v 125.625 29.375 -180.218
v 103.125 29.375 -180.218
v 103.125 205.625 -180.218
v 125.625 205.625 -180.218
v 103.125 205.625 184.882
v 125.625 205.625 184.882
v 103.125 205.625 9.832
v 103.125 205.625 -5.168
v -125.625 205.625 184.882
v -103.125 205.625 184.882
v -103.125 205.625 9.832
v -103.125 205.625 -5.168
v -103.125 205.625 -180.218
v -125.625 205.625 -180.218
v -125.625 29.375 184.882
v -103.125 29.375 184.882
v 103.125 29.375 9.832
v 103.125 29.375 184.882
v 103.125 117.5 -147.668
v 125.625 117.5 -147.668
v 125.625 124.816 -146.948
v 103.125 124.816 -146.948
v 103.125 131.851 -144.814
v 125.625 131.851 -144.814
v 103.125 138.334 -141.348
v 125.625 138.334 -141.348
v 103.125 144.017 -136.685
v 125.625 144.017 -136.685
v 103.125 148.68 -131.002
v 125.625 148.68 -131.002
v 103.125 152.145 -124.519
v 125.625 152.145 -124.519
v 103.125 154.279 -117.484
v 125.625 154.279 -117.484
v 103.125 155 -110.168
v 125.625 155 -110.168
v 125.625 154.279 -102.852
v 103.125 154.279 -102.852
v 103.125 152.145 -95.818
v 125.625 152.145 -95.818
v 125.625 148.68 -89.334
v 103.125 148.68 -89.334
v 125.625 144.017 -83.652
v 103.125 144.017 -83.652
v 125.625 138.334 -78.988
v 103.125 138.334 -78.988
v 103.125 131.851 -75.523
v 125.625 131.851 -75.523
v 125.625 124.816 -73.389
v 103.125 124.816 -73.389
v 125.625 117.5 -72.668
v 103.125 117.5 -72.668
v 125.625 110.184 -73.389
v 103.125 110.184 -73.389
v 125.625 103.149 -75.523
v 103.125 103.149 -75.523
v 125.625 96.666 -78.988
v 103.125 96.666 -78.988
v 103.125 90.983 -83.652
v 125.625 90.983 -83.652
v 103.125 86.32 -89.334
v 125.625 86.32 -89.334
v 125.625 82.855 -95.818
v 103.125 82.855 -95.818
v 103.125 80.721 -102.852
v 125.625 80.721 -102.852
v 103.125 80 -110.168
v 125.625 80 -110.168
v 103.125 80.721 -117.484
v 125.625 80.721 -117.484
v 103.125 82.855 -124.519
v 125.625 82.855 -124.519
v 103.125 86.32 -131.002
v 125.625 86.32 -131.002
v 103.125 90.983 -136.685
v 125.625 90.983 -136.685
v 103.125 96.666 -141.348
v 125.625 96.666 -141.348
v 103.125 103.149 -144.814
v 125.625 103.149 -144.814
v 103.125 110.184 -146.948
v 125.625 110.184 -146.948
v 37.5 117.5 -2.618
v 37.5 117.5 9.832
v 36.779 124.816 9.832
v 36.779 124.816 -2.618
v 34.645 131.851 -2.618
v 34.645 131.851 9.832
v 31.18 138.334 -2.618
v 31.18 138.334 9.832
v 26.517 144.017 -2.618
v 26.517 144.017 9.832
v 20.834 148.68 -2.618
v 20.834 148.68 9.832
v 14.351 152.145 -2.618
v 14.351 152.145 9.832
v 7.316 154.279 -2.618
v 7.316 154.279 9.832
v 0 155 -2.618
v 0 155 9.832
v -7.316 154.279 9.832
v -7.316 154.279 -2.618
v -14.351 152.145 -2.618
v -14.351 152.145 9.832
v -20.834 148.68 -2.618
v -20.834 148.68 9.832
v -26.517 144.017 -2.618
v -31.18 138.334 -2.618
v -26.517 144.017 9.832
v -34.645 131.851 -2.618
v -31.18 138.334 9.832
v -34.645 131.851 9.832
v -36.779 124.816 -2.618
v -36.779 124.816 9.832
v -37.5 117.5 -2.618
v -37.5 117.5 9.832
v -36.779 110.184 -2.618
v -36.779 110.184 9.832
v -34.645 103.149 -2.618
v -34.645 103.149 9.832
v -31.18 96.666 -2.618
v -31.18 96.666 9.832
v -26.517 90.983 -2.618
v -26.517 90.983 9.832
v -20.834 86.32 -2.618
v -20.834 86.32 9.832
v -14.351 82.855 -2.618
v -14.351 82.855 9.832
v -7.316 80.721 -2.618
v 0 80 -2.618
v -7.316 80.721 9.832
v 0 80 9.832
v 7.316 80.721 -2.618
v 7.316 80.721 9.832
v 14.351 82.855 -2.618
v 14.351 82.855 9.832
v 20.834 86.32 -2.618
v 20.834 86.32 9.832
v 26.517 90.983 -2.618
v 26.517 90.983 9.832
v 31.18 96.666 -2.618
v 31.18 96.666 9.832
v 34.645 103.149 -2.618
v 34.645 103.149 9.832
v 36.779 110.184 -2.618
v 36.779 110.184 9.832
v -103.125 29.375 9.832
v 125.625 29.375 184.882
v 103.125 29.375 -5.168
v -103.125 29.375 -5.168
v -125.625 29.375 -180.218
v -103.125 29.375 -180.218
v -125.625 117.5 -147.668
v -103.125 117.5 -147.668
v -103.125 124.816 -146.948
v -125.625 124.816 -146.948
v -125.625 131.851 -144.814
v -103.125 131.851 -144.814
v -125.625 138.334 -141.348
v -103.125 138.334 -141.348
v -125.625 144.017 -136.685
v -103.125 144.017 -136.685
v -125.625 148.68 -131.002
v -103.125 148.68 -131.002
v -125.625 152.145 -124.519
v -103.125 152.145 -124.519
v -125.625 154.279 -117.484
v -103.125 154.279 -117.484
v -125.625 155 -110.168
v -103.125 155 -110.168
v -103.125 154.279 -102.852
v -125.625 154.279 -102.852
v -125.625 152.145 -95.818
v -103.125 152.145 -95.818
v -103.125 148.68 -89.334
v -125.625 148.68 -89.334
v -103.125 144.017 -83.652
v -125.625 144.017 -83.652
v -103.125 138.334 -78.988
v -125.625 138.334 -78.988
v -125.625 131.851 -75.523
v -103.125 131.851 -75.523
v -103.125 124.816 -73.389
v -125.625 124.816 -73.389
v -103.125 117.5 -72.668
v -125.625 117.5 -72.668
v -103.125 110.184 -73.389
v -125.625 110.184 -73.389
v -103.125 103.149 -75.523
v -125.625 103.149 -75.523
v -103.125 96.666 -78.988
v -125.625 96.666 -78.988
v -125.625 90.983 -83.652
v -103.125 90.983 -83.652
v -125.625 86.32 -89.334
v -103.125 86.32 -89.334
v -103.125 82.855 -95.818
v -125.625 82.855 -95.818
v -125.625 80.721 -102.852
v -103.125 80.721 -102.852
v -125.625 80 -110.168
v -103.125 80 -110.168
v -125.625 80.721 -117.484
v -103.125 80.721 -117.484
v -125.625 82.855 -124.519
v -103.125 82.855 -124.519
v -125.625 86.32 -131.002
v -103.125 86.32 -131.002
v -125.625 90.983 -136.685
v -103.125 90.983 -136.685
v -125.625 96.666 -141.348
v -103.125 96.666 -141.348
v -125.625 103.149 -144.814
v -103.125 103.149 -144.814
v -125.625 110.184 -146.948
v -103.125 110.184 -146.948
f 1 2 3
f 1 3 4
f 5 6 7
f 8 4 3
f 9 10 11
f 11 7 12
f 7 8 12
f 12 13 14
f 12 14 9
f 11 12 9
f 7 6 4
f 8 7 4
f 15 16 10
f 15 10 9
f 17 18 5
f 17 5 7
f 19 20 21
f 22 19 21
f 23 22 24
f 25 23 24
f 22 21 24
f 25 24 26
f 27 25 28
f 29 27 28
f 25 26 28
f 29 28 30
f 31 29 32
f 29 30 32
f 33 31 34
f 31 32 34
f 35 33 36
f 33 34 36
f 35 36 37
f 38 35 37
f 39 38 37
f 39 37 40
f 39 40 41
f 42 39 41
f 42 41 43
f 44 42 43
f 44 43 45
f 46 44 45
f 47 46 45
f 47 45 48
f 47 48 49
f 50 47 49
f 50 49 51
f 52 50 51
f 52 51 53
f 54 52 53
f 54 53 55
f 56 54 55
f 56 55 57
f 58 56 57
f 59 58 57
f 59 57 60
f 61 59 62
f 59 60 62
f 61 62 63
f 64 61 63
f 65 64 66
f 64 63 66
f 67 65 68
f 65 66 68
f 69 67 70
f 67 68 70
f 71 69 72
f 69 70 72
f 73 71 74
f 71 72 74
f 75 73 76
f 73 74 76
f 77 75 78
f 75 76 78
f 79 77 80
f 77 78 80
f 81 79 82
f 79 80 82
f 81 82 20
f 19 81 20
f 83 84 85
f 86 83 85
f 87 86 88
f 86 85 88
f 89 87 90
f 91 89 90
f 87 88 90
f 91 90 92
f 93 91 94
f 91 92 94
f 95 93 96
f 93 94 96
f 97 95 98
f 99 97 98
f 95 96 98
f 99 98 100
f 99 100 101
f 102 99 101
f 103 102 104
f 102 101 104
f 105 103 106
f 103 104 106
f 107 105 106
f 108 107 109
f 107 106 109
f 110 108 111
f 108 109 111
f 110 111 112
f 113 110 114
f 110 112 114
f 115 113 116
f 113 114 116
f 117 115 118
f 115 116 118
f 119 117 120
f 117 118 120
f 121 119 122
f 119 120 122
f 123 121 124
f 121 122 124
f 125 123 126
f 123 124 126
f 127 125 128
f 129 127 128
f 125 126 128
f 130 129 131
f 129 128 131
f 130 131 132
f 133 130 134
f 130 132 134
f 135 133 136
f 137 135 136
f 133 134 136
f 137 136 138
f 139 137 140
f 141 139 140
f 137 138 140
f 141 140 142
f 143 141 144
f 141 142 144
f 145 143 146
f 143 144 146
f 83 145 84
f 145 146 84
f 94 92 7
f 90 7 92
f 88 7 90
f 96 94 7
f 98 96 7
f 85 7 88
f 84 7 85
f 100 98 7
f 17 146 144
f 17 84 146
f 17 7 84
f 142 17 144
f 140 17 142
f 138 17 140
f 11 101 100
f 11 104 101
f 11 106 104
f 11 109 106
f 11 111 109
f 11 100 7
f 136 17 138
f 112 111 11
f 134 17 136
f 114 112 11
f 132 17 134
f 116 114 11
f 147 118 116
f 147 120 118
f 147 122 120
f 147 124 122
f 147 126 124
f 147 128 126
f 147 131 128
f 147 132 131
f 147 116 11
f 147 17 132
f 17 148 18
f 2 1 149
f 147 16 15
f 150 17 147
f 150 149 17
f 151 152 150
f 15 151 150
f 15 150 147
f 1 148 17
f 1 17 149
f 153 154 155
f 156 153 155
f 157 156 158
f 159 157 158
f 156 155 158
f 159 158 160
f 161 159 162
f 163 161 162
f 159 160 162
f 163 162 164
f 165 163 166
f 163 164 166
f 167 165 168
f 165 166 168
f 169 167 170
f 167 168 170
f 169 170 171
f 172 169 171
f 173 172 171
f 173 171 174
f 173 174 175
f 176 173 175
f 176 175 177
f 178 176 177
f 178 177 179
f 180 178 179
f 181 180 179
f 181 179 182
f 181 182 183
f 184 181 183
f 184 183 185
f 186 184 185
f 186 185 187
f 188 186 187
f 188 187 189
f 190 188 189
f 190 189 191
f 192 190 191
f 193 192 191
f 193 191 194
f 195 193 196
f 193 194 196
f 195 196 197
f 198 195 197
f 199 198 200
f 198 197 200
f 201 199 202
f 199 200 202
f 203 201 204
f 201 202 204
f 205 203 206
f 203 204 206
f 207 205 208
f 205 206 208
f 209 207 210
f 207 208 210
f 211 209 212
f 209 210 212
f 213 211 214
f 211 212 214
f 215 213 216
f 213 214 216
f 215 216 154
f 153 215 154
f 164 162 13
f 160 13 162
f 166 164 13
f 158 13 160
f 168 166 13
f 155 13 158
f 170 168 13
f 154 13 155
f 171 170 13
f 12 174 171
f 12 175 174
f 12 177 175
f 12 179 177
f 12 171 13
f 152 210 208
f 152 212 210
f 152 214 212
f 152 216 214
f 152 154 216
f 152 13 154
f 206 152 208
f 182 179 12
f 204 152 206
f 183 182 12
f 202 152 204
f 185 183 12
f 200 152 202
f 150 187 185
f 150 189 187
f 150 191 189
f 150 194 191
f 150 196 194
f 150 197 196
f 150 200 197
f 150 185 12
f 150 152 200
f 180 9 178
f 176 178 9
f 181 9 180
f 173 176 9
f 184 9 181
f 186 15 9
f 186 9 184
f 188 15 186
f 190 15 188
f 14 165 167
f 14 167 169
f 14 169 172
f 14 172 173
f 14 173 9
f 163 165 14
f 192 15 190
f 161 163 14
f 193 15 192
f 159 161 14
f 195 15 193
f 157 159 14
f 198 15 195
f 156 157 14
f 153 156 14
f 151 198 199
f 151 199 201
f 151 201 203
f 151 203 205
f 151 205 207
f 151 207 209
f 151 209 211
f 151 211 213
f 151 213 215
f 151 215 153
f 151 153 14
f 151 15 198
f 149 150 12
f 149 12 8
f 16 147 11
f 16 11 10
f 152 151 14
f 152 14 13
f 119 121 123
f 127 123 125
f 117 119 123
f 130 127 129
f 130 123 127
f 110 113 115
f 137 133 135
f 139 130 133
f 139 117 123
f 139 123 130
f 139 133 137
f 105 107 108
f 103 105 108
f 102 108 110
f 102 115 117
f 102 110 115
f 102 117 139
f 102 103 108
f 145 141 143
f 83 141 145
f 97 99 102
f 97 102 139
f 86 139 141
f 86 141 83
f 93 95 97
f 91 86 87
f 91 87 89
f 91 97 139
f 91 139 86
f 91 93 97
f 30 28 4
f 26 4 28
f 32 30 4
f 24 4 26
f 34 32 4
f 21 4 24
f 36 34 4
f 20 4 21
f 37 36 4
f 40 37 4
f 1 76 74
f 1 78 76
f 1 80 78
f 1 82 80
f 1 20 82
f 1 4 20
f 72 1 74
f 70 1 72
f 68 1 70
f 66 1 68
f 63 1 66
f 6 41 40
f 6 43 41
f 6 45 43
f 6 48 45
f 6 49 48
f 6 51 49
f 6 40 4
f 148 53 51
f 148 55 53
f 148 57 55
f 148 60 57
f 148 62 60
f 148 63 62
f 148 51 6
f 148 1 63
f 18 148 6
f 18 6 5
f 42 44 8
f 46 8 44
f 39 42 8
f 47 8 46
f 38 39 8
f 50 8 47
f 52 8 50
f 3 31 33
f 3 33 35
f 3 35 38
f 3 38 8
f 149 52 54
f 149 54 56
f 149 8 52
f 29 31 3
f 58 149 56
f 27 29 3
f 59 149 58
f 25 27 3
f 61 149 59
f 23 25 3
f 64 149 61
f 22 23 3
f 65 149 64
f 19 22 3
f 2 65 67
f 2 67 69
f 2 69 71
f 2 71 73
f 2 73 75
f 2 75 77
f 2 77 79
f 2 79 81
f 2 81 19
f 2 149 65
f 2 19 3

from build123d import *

# Parameters (mm, degrees)
BOSS_EXTRUDE2_DEPTH = 235
SKETCH2_R           = 50
CUT_EXTRUDE1_DEPTH  = 16.6
SKETCH4_R           = 50
CUT_EXTRUDE2_DEPTH  = 667.6
SCALE1_SCALE        = 0.75


with BuildPart() as part:
    # Sketch1 → Boss-Extrude2 (new body)
    with BuildSketch(Plane(origin=(0, 0, 0), x_dir=(1, 0, 0), z_dir=(0, 1, 0))):
        Polygon((-137.5, -243.4), (-167.5, -243.4), (-167.5, 243.4), (-137.5, 243.4), (-137.5, 10), (137.5, 10), (137.5, 243.4), (167.5, 243.4), (167.5, -243.4), (137.5, -243.4), (137.5, -10), (-137.5, -10), align=None)
    extrude(amount=BOSS_EXTRUDE2_DEPTH)

    # Sketch2 → Cut-Extrude1 (cut)
    with BuildSketch(Plane.XY.offset(10)):
        with Locations((0, 117.5)):
            Circle(SKETCH2_R)
    extrude(amount=-CUT_EXTRUDE1_DEPTH, mode=Mode.SUBTRACT)

    # Sketch4 → Cut-Extrude2 (cut)
    with BuildSketch(Plane(origin=(167.5, 0, 0), x_dir=(0, 0, -1), z_dir=(1, 0, 0))):
        with Locations((150, 117.5)):
            Circle(SKETCH4_R)
    extrude(amount=-CUT_EXTRUDE2_DEPTH, mode=Mode.SUBTRACT)


with BuildPart() as part_1:
    # Scale1: scaled about (0, 117.5, 9.327119411)
    add(part.part.scale(SCALE1_SCALE).moved(Location((0, 29.375, 2.331779853))))


solid = part_1.part
